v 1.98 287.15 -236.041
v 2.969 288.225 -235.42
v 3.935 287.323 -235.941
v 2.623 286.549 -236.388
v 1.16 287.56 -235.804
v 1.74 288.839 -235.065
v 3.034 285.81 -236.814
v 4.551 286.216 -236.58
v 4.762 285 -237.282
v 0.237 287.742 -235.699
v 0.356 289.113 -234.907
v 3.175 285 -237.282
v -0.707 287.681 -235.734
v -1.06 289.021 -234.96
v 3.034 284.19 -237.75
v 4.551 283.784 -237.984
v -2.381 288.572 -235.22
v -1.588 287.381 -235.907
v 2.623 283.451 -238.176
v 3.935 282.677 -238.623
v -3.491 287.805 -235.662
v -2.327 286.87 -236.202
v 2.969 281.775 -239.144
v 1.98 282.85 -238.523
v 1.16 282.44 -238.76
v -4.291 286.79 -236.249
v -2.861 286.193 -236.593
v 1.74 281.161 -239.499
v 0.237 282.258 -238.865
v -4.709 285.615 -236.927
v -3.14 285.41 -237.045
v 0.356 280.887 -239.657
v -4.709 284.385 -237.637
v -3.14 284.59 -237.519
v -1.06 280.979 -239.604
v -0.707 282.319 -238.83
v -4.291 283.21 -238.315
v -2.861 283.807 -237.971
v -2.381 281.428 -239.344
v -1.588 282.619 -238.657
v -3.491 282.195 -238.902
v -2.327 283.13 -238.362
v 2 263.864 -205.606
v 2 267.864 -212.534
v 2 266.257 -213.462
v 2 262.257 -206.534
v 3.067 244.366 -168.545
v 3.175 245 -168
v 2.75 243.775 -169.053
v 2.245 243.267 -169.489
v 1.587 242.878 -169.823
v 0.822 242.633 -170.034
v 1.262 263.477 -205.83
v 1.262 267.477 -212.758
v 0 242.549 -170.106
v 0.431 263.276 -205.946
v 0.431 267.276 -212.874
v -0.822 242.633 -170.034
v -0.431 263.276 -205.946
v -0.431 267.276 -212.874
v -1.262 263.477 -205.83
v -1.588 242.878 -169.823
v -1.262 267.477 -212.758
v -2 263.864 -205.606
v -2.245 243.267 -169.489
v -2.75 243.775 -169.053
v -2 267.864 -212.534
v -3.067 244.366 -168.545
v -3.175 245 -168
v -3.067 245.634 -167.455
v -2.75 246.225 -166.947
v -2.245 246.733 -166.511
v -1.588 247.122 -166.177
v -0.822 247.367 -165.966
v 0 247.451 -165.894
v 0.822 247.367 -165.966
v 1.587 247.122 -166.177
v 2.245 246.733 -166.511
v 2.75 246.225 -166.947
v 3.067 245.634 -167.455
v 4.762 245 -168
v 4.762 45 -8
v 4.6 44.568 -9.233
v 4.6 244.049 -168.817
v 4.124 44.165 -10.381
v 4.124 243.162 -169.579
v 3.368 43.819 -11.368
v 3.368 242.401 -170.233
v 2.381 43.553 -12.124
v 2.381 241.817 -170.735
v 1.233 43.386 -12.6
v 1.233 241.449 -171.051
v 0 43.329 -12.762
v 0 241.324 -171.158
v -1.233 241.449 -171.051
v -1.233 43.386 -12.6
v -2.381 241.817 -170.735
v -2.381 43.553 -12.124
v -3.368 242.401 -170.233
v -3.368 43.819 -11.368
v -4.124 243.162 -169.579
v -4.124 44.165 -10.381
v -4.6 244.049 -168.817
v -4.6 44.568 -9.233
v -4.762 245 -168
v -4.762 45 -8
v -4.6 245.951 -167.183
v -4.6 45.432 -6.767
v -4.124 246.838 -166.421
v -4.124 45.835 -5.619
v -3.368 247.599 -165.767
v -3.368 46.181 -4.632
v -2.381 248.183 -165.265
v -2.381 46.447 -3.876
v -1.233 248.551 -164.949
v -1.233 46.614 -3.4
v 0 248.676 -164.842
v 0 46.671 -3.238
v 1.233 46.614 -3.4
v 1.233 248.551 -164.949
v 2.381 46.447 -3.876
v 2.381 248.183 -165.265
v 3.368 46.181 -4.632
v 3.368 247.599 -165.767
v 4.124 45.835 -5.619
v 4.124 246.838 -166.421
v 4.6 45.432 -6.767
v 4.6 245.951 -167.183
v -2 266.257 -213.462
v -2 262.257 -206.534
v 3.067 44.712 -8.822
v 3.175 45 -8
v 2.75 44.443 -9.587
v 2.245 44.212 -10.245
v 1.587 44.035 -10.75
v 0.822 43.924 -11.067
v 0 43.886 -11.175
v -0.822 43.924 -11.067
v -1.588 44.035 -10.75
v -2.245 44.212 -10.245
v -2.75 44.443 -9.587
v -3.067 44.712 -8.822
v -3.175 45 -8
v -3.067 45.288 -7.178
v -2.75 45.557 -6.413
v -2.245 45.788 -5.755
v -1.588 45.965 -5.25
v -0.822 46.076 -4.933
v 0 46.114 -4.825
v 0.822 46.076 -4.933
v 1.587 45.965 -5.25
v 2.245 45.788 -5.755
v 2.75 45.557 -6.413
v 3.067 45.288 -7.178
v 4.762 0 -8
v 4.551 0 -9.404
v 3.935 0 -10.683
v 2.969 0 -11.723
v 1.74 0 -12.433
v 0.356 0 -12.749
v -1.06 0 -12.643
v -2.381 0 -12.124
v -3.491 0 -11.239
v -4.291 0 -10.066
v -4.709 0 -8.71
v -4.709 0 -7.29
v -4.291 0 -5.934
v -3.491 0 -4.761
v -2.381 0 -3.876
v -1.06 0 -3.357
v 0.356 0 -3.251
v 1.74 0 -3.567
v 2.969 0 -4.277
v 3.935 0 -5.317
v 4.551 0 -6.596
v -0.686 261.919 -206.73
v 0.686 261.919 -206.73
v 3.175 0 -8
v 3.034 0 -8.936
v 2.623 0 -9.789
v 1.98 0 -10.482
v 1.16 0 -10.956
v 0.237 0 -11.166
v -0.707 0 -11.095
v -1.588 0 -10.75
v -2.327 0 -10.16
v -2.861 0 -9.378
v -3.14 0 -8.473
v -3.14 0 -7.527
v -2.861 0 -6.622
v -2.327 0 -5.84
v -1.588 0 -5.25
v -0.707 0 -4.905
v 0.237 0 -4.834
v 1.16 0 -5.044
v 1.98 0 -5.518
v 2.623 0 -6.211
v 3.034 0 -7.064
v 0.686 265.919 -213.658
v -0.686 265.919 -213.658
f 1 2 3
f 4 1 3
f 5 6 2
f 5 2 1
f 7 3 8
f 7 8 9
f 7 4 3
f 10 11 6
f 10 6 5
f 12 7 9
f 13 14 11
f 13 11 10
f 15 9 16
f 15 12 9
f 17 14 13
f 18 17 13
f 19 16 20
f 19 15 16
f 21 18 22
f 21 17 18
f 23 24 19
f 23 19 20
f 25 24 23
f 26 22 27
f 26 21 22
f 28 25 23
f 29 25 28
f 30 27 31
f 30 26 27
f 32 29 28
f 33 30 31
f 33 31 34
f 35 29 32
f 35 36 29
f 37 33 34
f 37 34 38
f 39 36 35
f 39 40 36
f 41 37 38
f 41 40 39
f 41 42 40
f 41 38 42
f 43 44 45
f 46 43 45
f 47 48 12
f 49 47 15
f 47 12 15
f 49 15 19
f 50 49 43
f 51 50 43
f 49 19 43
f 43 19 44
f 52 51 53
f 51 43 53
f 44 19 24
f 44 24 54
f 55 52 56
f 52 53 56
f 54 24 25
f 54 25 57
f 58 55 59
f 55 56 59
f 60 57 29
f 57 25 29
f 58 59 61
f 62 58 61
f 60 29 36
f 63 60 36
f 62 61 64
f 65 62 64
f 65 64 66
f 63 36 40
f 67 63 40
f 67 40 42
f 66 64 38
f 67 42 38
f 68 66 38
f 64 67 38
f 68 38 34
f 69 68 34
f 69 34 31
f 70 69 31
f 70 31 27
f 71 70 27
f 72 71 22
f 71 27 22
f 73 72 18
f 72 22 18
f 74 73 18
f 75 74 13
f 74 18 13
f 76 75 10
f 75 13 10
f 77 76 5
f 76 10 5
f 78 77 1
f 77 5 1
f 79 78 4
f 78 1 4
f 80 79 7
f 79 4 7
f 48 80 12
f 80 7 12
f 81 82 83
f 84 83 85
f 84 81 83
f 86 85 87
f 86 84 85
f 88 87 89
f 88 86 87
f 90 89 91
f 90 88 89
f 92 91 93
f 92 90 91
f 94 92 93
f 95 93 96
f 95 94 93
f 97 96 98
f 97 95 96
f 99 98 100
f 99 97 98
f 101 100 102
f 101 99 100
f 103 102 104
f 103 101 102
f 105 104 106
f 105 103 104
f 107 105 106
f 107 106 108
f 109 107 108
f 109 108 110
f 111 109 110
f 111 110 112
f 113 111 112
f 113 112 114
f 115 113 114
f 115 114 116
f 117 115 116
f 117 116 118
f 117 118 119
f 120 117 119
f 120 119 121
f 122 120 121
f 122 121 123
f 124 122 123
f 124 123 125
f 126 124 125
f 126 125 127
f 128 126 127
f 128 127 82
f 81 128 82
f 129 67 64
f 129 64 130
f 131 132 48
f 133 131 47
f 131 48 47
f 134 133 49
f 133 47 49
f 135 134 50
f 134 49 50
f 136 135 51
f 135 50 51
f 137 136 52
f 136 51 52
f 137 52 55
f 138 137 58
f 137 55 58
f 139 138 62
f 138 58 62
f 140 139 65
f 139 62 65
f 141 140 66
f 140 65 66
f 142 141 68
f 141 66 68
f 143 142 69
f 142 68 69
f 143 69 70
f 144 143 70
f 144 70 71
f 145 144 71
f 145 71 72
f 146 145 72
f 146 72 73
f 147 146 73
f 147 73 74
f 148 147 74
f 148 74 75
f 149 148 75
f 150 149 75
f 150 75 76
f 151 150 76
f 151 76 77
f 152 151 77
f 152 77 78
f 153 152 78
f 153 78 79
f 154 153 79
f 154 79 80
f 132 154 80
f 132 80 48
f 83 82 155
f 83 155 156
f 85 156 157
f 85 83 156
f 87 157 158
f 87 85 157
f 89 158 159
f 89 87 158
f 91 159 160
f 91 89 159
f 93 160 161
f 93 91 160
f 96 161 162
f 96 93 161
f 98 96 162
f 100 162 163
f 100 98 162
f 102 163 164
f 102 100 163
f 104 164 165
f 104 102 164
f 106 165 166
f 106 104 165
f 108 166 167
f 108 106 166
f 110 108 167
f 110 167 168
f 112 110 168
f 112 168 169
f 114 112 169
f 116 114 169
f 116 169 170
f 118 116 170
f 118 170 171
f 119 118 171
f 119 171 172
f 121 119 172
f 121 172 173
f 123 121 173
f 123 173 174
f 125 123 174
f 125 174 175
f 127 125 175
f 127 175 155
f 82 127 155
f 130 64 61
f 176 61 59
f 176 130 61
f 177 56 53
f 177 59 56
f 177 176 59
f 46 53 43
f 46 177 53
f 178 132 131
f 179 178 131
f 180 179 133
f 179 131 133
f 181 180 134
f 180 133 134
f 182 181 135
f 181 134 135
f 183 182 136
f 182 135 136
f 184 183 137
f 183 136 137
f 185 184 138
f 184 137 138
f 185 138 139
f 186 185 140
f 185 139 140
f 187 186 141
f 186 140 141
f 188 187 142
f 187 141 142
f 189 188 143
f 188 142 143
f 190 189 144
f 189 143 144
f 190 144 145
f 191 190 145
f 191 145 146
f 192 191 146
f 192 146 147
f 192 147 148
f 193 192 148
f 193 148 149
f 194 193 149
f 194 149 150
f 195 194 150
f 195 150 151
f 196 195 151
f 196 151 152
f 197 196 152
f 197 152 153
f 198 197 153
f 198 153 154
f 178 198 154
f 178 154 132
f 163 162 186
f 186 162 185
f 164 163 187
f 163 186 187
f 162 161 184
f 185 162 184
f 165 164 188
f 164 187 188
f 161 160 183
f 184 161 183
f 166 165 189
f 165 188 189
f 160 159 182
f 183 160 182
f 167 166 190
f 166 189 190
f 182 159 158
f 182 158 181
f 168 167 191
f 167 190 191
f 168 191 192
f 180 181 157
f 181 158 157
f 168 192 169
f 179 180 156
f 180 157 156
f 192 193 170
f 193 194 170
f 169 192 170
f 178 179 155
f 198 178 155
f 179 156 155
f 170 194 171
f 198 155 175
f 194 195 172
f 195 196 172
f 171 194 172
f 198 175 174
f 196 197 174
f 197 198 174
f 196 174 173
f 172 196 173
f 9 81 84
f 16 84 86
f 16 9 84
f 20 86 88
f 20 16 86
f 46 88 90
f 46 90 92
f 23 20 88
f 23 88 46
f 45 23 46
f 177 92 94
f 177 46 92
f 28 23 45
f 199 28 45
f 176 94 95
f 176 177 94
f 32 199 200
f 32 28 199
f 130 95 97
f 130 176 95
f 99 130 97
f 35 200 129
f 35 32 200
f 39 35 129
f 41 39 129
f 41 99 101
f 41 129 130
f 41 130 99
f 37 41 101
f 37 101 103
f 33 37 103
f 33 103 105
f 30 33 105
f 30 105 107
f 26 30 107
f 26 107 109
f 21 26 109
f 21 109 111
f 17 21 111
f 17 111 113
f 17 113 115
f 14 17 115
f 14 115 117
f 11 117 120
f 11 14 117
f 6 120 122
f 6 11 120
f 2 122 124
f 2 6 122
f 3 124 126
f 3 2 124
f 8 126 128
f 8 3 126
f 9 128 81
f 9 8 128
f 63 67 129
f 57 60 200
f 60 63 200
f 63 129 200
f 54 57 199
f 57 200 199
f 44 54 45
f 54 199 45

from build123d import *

# Parameters (mm, degrees)
SKETCH2_R          = 4.7625
SKETCH2_R_2        = 3.175
SKETCH11_W         = 4
SKETCH11_H         = 4.7625
CUT_EXTRUDE2_DEPTH = 8


with BuildPart() as part:
    # Sweep2: sweep along a path in Sketch4
    with BuildLine(Plane(origin=(0, 0, 0), x_dir=(0, 0, -1), z_dir=(1, 0, 0))) as sweep2_path:
        Line((8, 0), (8, 45))
        Line((8, 45), (168, 245))
        Line((168, 245), (237.282032303, 285))
    # Sketch2 → Sweep2 (sweep)
    with BuildSketch(Plane(origin=(0, 0, 0), x_dir=(1, 0, 0), z_dir=(0, 1, 0))):
        with Locations((0, 8)):
            Circle(SKETCH2_R)
        with Locations((0, 8)):
            Circle(SKETCH2_R_2, mode=Mode.SUBTRACT)
    sweep(path=sweep2_path.line, transition=Transition.RIGHT)

    # Sketch11 → Cut-Extrude2 (cut)
    with BuildSketch(Plane(origin=(0, 158.996133918, -275.389382153), x_dir=(1, 0, 0), z_dir=(0, 0.5, -0.866025404))):
        with Locations((0, -125.794973927)):
            Rectangle(SKETCH11_W, SKETCH11_H)
    extrude(amount=-CUT_EXTRUDE2_DEPTH, mode=Mode.SUBTRACT)


solid = part.part
